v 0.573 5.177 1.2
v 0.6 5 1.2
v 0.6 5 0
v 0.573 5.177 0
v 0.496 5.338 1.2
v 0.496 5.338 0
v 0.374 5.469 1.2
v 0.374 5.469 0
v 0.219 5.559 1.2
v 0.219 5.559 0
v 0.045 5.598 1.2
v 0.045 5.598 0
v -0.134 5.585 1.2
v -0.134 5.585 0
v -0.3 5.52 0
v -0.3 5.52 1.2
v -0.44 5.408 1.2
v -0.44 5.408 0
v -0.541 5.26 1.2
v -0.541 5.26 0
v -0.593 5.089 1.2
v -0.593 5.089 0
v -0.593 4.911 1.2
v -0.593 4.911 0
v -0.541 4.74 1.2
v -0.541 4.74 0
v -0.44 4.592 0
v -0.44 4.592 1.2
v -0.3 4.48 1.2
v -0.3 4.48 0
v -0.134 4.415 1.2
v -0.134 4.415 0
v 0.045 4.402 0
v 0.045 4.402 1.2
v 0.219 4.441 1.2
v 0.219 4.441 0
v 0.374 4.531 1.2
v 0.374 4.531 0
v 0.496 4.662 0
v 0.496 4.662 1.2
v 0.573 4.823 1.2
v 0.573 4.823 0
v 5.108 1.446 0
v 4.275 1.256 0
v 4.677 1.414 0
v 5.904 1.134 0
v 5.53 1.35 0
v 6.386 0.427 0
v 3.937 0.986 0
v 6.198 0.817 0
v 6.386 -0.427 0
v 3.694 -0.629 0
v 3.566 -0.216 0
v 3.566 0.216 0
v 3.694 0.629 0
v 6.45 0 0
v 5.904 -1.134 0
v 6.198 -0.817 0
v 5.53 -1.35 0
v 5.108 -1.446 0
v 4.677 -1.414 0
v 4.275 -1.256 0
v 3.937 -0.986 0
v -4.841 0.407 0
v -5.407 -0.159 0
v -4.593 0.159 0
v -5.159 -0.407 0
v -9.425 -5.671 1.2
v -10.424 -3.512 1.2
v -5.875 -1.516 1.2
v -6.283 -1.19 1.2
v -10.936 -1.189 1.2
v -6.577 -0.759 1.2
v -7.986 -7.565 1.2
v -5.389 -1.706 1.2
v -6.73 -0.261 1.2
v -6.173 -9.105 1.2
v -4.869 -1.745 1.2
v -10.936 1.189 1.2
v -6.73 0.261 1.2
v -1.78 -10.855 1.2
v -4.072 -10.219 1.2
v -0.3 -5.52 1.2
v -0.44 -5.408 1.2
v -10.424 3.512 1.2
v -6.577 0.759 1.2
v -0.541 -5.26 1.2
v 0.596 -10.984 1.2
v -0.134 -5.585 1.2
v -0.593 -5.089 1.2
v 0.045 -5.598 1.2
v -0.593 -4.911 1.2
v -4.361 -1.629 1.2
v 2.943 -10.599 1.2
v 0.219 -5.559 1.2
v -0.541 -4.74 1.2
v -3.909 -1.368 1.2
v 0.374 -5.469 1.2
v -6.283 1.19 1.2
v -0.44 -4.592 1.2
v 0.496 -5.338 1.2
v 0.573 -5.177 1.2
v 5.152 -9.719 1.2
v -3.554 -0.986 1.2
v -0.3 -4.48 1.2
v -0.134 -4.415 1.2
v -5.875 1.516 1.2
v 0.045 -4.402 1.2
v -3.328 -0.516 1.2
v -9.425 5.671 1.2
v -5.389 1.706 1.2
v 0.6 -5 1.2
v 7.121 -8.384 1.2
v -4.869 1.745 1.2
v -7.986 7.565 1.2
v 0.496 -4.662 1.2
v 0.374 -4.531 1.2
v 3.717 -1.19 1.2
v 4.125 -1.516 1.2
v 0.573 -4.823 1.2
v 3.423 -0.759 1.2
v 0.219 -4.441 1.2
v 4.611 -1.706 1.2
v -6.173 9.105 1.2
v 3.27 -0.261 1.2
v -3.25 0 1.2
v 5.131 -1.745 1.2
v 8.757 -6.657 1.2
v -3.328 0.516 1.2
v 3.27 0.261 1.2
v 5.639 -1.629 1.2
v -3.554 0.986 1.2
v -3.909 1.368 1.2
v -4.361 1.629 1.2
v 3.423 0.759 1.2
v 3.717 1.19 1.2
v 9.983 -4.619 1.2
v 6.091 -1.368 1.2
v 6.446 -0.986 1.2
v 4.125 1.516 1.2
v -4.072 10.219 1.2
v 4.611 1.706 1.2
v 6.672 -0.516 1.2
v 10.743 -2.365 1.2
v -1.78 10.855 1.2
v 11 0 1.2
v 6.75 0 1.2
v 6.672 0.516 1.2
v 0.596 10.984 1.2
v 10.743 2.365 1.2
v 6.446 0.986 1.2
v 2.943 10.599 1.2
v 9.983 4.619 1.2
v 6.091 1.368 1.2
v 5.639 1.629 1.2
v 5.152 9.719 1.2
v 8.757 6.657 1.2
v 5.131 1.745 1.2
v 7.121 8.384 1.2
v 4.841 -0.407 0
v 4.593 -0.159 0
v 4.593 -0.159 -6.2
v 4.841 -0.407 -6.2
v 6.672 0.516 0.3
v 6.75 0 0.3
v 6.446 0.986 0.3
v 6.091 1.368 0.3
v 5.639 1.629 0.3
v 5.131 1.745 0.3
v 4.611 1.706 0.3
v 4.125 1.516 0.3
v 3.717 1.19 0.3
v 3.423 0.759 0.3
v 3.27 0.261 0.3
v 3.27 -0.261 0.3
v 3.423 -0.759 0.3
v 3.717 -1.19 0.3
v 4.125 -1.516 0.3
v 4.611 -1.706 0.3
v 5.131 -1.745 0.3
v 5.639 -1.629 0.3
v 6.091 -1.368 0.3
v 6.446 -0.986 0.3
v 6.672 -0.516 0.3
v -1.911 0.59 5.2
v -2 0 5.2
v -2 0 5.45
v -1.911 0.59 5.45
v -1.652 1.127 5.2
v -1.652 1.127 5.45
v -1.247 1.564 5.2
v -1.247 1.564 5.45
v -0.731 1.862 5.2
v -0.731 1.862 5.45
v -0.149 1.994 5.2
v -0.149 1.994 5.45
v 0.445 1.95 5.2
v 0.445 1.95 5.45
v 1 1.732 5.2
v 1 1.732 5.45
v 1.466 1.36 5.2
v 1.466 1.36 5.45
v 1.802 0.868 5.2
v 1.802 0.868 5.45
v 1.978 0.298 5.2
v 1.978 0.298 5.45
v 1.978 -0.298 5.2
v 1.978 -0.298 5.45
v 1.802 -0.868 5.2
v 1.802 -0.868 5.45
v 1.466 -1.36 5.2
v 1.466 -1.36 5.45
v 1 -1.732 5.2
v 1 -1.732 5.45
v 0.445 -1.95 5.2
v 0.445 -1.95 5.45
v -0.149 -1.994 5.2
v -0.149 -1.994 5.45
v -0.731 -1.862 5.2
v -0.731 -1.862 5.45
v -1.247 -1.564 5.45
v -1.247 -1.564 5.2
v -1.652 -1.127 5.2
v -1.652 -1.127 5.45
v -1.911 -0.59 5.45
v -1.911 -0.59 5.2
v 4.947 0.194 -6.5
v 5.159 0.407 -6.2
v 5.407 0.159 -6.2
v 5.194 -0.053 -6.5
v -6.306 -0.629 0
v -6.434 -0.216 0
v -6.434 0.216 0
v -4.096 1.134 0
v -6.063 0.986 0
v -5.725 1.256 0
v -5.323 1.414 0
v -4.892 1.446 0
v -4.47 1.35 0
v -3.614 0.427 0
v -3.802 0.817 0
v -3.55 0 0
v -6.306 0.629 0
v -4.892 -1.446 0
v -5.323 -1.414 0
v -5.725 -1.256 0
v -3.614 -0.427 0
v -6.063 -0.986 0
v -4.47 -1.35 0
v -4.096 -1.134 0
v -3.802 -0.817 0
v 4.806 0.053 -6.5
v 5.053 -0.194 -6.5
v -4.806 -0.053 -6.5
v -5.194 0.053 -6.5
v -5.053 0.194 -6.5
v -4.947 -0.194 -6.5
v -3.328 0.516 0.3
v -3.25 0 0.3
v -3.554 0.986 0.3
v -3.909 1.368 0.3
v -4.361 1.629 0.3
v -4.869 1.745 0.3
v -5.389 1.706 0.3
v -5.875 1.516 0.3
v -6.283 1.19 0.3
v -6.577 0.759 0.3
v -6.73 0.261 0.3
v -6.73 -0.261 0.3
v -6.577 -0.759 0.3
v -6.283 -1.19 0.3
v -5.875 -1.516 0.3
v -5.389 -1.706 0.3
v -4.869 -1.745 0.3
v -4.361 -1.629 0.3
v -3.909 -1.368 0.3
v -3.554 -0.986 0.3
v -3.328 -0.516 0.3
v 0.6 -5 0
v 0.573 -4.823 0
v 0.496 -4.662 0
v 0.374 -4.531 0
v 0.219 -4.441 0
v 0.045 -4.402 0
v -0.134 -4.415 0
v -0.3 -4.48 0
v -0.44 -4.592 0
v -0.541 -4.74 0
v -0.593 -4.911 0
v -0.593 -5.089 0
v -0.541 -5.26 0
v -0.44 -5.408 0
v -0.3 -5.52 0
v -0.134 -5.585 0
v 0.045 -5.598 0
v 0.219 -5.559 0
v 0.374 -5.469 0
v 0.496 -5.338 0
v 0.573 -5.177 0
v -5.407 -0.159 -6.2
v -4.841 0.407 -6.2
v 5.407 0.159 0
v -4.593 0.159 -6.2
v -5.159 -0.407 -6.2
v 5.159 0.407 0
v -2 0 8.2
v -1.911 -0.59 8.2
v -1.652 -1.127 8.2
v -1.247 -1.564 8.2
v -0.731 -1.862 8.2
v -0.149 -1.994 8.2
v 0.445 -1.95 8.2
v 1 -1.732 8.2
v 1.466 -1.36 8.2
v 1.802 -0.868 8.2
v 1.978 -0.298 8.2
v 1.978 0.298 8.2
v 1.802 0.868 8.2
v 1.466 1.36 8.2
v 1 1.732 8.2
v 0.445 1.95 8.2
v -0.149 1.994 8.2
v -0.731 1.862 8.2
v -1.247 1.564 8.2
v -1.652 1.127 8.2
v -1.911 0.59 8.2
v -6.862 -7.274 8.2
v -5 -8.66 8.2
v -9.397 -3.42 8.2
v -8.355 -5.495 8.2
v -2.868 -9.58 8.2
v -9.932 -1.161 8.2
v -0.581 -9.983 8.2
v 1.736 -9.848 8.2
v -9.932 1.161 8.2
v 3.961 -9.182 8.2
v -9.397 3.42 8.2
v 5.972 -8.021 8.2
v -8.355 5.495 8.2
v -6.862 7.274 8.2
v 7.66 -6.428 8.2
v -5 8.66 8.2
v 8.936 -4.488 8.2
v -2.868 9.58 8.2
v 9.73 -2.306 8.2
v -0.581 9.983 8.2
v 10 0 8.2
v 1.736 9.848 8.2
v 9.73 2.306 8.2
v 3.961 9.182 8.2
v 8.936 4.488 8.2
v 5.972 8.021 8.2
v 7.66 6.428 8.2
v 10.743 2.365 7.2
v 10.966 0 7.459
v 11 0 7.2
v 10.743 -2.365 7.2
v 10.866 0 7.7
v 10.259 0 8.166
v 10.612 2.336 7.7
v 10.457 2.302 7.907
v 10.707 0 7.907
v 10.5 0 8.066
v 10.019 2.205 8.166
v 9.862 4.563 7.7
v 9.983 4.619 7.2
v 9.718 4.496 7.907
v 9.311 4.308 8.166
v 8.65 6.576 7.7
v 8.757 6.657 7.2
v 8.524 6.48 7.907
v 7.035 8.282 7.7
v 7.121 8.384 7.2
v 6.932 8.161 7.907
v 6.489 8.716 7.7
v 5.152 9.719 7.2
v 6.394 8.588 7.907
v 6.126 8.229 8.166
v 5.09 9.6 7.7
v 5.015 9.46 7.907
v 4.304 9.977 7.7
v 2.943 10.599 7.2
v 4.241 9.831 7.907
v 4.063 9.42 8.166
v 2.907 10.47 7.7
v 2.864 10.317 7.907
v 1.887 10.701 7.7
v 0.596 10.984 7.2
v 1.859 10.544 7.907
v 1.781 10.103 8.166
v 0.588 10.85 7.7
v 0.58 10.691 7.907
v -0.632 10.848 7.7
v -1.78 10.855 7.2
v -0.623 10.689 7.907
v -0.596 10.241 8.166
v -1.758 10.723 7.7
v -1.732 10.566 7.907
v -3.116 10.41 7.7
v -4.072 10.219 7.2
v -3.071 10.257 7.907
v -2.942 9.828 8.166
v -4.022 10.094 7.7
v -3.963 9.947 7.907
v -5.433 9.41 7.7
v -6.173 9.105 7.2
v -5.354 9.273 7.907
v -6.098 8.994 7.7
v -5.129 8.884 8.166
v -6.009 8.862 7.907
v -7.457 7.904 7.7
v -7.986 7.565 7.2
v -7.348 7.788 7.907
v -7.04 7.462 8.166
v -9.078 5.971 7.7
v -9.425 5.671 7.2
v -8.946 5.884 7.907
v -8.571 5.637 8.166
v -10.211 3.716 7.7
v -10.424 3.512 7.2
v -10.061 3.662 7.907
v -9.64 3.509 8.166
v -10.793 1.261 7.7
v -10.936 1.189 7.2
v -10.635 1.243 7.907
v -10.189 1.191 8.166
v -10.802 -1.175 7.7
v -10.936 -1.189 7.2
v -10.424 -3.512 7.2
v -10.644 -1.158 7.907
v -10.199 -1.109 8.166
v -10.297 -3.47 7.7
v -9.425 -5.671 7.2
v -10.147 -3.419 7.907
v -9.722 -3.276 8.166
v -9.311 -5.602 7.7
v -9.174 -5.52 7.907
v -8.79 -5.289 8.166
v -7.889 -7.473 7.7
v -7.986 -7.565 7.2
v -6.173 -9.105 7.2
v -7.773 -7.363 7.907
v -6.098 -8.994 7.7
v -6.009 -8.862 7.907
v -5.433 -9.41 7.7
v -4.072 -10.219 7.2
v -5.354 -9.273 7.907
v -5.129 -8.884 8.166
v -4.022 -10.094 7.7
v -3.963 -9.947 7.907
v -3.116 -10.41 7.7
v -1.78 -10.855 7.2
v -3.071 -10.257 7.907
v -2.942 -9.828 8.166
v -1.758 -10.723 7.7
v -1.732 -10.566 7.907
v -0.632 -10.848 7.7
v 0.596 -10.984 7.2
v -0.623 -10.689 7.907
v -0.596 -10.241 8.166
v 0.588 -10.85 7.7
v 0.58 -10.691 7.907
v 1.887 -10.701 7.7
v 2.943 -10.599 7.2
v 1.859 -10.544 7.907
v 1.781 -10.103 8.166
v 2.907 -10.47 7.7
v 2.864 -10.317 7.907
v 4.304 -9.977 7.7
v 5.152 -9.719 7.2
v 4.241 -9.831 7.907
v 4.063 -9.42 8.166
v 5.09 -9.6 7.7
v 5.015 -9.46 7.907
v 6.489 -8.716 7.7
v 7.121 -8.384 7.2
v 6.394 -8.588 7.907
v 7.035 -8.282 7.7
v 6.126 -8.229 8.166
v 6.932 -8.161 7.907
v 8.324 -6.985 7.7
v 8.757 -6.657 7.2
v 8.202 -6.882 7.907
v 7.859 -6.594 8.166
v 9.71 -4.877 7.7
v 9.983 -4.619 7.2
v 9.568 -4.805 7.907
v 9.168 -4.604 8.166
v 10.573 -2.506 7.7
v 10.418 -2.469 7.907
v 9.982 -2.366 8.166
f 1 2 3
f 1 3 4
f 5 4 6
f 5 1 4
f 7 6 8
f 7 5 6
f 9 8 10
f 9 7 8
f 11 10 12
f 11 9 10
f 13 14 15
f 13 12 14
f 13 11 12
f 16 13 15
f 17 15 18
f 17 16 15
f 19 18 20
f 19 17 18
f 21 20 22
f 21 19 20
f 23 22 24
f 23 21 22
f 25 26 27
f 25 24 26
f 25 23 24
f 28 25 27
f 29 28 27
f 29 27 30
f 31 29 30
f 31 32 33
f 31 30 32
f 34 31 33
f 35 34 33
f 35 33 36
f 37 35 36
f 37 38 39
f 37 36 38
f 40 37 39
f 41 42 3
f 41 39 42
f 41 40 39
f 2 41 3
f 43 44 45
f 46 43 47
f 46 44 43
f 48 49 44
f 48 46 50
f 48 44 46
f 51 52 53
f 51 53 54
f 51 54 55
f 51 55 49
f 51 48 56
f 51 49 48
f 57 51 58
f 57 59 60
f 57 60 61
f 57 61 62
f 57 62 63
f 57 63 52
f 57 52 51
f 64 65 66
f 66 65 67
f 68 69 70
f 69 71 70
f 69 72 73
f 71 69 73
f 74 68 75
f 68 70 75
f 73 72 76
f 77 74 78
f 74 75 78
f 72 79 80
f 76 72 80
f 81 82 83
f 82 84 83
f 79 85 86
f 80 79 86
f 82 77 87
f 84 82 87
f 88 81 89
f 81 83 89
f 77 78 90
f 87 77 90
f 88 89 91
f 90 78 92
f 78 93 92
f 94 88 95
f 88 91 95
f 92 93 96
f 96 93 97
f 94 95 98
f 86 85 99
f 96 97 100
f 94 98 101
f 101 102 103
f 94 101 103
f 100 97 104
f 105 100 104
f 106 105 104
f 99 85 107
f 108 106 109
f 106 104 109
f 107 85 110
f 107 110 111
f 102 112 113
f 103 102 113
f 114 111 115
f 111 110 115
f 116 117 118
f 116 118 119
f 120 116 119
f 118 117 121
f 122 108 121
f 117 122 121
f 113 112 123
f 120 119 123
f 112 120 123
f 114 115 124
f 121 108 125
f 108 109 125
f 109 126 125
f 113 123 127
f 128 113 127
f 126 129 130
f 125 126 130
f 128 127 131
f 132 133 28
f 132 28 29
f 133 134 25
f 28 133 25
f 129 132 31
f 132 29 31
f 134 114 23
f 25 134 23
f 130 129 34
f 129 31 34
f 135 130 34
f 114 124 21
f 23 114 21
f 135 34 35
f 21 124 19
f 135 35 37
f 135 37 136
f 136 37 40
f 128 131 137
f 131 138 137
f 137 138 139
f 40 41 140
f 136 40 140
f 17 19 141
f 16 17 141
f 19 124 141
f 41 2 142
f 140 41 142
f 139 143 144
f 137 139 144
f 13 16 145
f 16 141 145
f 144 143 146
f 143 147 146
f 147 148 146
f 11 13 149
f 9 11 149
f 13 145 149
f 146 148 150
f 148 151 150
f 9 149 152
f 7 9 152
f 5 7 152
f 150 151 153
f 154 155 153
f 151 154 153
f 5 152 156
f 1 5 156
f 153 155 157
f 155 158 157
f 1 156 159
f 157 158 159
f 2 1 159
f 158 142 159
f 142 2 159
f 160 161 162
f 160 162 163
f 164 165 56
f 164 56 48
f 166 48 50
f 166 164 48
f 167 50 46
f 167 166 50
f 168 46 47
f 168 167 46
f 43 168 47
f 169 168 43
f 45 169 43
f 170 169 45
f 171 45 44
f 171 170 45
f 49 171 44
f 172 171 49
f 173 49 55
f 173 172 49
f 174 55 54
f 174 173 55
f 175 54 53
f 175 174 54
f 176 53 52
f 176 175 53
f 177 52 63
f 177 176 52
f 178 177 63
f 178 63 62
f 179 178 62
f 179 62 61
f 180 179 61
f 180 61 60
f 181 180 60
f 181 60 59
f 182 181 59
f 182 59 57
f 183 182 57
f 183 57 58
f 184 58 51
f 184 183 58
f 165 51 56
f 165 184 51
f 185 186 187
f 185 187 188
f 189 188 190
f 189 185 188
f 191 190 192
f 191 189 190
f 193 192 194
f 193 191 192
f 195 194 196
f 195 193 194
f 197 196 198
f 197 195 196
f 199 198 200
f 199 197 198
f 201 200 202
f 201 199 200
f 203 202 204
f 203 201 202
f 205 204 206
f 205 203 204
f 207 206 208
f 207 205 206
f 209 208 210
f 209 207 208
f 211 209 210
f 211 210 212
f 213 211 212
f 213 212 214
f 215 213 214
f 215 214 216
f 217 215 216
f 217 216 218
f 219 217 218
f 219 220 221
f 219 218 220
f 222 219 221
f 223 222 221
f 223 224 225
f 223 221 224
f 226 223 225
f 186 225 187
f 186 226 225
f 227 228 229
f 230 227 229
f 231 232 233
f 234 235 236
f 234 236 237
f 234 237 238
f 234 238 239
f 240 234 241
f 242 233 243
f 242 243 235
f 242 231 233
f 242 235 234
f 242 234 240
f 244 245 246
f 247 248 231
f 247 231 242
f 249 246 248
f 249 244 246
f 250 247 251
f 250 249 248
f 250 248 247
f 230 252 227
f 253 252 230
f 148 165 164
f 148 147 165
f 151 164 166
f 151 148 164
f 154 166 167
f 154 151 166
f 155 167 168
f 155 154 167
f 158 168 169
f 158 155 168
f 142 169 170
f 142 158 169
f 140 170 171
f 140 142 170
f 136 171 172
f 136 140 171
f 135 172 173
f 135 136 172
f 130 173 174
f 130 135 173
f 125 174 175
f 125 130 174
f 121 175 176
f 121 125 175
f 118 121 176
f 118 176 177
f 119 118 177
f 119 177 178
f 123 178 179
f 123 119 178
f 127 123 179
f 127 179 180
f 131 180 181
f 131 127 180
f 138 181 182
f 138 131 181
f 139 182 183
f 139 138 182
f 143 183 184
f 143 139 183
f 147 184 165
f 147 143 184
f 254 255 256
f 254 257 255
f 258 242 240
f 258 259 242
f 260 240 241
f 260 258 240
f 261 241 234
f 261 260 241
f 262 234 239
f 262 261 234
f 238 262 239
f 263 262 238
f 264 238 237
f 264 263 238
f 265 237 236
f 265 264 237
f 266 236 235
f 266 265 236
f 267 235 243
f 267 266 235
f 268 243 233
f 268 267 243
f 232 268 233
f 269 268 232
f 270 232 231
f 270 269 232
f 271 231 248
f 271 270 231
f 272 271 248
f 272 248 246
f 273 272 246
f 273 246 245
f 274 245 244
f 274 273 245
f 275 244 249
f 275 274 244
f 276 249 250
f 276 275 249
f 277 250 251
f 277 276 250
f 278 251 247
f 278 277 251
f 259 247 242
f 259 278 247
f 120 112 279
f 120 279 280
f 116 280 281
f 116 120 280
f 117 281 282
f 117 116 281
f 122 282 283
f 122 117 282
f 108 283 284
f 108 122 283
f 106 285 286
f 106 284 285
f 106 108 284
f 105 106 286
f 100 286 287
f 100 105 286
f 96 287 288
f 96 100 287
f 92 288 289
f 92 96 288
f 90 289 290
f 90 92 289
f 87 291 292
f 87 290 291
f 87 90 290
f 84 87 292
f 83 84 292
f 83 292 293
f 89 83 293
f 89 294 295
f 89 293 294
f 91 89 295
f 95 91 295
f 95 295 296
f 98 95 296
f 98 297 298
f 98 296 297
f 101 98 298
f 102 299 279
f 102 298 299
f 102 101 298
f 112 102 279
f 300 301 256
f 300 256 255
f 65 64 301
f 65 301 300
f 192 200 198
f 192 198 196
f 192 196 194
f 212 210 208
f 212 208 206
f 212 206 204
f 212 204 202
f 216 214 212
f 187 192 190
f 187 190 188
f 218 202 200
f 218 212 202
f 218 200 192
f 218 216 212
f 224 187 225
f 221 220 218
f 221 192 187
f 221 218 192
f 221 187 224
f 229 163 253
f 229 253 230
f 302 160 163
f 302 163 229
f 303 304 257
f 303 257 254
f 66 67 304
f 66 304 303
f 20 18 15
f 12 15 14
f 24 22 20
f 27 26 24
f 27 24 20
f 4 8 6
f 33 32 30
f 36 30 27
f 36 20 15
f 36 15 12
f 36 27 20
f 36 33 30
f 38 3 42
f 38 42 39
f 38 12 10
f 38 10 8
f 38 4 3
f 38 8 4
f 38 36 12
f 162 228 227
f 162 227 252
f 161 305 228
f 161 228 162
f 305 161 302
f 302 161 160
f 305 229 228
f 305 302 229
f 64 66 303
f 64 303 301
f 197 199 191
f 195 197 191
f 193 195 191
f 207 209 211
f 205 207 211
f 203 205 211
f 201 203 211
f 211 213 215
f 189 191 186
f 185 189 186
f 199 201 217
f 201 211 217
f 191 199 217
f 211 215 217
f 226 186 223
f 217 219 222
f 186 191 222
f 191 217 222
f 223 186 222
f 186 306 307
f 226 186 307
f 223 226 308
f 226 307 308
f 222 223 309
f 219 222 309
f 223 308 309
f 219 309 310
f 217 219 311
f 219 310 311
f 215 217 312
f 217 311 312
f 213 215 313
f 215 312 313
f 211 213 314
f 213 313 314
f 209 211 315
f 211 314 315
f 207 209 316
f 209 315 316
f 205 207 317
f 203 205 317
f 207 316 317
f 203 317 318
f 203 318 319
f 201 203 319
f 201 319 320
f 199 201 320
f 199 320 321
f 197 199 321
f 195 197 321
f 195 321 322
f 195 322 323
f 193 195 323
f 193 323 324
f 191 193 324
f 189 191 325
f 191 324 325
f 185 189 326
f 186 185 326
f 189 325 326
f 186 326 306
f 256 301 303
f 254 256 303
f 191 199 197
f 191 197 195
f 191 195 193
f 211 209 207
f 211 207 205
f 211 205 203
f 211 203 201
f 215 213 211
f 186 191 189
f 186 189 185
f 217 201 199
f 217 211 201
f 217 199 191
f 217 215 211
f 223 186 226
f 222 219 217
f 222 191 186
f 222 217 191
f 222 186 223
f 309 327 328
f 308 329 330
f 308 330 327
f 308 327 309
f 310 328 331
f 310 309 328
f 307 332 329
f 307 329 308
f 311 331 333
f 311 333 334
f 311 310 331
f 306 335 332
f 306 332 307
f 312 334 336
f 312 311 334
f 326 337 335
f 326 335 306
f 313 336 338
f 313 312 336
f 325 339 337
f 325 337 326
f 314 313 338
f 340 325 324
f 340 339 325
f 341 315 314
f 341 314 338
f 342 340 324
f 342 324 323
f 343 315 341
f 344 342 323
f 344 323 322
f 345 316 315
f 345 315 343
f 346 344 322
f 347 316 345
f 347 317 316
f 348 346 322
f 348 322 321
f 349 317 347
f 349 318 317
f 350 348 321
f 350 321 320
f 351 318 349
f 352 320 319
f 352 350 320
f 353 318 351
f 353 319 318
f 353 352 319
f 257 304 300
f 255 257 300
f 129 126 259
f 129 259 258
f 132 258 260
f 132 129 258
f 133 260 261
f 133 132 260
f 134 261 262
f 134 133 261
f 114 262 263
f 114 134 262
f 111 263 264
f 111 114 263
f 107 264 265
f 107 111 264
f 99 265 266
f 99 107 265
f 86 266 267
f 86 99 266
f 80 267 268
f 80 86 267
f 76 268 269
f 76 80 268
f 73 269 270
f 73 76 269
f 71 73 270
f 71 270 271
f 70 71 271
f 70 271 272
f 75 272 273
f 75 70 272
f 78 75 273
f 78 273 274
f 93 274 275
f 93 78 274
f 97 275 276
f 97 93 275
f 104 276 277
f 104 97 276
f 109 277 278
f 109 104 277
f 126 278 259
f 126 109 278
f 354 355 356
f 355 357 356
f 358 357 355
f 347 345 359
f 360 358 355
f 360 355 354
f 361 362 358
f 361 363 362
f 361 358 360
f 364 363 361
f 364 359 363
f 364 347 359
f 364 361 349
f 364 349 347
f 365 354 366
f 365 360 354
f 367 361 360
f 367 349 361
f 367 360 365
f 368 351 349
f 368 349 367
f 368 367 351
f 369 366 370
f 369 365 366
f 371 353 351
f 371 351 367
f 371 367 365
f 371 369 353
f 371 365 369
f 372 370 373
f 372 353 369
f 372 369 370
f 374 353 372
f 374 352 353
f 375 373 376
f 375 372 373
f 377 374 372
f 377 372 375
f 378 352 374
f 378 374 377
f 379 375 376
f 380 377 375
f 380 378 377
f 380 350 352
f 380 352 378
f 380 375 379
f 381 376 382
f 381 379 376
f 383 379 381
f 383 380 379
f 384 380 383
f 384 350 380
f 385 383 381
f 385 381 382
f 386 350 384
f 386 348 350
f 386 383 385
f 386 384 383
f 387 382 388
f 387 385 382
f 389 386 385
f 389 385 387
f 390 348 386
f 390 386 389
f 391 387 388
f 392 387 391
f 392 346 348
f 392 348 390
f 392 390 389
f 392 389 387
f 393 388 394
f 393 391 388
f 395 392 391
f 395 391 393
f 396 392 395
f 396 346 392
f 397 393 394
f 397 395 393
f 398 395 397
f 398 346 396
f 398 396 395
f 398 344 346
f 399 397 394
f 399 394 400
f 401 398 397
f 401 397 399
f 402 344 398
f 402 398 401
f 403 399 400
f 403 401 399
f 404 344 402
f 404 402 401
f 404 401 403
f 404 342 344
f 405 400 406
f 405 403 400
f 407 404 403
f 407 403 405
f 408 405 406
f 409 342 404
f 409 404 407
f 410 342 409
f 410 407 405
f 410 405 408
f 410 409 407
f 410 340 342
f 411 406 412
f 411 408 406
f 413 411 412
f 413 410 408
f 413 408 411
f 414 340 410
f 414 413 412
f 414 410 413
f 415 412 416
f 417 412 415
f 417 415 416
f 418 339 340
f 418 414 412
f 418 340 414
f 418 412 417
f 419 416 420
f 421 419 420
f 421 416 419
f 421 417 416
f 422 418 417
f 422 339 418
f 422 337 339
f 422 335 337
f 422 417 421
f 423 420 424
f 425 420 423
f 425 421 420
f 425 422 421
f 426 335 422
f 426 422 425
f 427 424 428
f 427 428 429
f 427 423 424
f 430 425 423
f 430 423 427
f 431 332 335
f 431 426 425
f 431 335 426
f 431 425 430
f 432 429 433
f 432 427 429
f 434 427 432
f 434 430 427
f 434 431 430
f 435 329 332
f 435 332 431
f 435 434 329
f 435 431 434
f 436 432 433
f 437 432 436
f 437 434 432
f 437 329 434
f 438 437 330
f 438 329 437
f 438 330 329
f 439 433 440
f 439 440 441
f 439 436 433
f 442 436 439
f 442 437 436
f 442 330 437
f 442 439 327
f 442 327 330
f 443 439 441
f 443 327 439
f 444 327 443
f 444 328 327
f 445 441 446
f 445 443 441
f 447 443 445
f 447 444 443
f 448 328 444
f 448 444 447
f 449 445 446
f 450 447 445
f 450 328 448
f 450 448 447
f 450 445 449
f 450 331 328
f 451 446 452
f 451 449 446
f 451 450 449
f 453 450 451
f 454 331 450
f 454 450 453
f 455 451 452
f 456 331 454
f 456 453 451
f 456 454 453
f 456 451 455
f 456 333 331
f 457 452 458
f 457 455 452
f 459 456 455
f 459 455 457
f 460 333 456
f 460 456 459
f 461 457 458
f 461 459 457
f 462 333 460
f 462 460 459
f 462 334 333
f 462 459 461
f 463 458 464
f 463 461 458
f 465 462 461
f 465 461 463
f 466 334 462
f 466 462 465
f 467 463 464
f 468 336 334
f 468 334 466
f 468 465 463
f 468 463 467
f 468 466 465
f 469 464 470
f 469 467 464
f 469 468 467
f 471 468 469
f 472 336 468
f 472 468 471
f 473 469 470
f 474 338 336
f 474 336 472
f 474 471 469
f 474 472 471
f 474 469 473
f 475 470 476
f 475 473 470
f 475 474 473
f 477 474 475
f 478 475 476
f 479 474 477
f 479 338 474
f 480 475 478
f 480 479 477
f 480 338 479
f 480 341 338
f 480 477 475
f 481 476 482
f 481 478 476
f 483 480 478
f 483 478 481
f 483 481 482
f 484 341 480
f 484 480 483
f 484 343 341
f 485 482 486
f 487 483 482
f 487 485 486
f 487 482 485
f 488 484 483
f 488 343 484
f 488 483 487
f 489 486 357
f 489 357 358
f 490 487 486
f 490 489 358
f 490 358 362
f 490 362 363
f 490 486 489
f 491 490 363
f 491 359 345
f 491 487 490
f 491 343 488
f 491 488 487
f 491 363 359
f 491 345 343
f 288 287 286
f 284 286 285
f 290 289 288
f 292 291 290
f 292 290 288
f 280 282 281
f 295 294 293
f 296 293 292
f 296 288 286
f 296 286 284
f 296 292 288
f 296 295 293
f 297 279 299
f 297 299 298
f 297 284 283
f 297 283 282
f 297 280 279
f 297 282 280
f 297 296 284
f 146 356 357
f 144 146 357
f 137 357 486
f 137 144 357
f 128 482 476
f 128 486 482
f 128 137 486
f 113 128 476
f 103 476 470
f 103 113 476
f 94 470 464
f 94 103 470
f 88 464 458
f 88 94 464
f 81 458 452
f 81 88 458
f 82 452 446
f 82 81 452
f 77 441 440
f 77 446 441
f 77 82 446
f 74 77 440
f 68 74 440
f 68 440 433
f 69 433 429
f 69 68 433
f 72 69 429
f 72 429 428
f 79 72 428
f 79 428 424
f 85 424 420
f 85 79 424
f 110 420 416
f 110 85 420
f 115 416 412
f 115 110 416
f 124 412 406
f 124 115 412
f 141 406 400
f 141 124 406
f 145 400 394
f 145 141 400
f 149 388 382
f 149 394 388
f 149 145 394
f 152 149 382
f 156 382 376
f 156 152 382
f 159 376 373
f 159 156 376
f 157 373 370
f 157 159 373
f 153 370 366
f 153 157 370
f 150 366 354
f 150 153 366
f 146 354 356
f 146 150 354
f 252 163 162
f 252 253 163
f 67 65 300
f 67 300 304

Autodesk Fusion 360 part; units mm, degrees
ref_plane "WorkPlane1" through (0, 0, 1.2) normal (0, 0, 1) x (1, 0, 0) in component "Body"
sketch "Sketch1" plane through (0, 0, 1.2) normal (0, 0, 1) x (1, 0, 0) in component "Body"
  circle A0 centre (0, 0) radius 11
  dimension "d2" = 22
extrude "Extrude1" add sketch "Sketch1" along normal blind 7 makes body 1 in component "Body"
fillet "Fillet1" radius 1 1 edges at (-10.2556, -3.9778, 8.2) on bodies 1 in component "Body"
sketch "Sketch2" plane through (0, 0, 1.2) normal (0, 0, -1) x (1, 0, 0) in component "Body"
  circle A0 centre (0, 0) radius 11
  line L0 (0, 11) -> (0, -11) construction
  circle A1 centre (0, 5) radius 0.6
  circle A2 centre (0, -5) radius 0.6
  line L1 (-11, 0) -> (11, 0) construction
  circle A3 centre (-5, 0) radius 1.75
  circle A4 centre (5, 0) radius 1.75
  dimension "d7" = 1.2
  dimension "d8" = 10
  dimension "d9" = 3.5
  dimension "d10" = 10
extrude "Extrude2" add sketch "Sketch2" along normal blind 1.2 contours A1 | A2 | A3 | A4 bodies 1 in component "Body"
chamfer "Chamfer1" distance 0.3 angle 45 2 edges at (-6.6316, 0.6328, 0) (3.3684, 0.6328, 0) on bodies 1 in component "Body"
sketch "Sketch3" plane through (0, 0, 8.2) normal (0, 0, 1) x (-1, 0, 0) in component "Body"
  circle A0 centre (0, 0) radius 10
  circle A1 centre (0, 0) radius 2
  dimension "d14" = 4
extrude "Extrude3" cut sketch "Sketch3" against normal blind 3 contours A1 bodies 1 in component "Body"
extrude "Extrude1'" add 1 faces at (-0.637, -0.1965, 5.2) along direction (0, 0, 1) blind 0.25 separate body on bodies 1 makes body 2 in component "Transducer"
sketch "Sketch1 (2)" plane through (0, 0, 0) normal (0, 0, -1) x (1, 0, 0) in component "Pins"
  circle A0 centre (-5, 0) radius 1.45
  circle A1 centre (-5, 0) radius 1.75
  line L0 (-4.5934, -0.1591) -> (-4.8409, -0.4066)
  line L1 (-4.8409, -0.4066) -> (-5.4066, 0.1591)
  line L2 (-5.4066, 0.1591) -> (-5.1591, 0.4066)
  line L3 (-5.1591, 0.4066) -> (-4.5934, -0.1591)
  line L4 (-4.5934, -0.1591) -> (-5.4066, 0.1591) construction
  line L5 (-4.8409, -0.4066) -> (-5.1591, 0.4066) construction
  line L6 (-5, 0) -> (-5.0493, 0.0193)
  line L7 (-5, 0) -> (-6.75, 0) construction
  line L8 (-5, 0) -> (-6.2374, 1.2374) construction
  circle A2 centre (5, 0) radius 1.75
  line L9 (5, 0) -> (3.25, 0) construction
  line L10 (5, 0) -> (3.7626, 1.2374) construction
  line L11 (5.4066, -0.1591) -> (5.1591, -0.4066)
  line L12 (5.1591, -0.4066) -> (4.5934, 0.1591)
  line L13 (4.5934, 0.1591) -> (4.8409, 0.4066)
  line L14 (4.8409, 0.4066) -> (5.4066, -0.1591)
  line L15 (5.4066, -0.1591) -> (4.5934, 0.1591) construction
  line L16 (5.1591, -0.4066) -> (4.8409, 0.4066) construction
  point P0 (-5, 0)
  point P1 (5, 0)
  dimension "d19" = 0.35
  dimension "d20" = 0.8
  dimension "d21" = 45
  dimension "d24" = 45
extrude "Extrude1''" add sketch "Sketch1 (2)" along normal blind 6.5 separate body contours L0 L1 L2 L3 | L11 L12 L13 L14 makes body 3 at (-5.0295, 0.218, -2.1667) makes body 4 at (4.9705, 0.218, -2.1667) in component "Pins"
chamfer "Chamfer1'" distance 0.3 angle 45 4 edges at (4.7172, -0.2828, -6.5) (5.2828, 0.2828, -6.5) (-5.2828, -0.2828, -6.5) (-4.7172, 0.2828, -6.5) on bodies 3 4 in component "Pins"
component "Body" placed x (1, 0, 0) y (0, 1, 0) z (0, 0, 1) at (0, 0, 0)
component "Transducer" placed x (1, 0, 0) y (0, 1, 0) z (0, 0, 1) at (0, 0, 0)
component "Pins" placed x (1, 0, 0) y (0, 1, 0) z (0, 0, 1) at (0, 0, 0)
equation "d24 = d21"
